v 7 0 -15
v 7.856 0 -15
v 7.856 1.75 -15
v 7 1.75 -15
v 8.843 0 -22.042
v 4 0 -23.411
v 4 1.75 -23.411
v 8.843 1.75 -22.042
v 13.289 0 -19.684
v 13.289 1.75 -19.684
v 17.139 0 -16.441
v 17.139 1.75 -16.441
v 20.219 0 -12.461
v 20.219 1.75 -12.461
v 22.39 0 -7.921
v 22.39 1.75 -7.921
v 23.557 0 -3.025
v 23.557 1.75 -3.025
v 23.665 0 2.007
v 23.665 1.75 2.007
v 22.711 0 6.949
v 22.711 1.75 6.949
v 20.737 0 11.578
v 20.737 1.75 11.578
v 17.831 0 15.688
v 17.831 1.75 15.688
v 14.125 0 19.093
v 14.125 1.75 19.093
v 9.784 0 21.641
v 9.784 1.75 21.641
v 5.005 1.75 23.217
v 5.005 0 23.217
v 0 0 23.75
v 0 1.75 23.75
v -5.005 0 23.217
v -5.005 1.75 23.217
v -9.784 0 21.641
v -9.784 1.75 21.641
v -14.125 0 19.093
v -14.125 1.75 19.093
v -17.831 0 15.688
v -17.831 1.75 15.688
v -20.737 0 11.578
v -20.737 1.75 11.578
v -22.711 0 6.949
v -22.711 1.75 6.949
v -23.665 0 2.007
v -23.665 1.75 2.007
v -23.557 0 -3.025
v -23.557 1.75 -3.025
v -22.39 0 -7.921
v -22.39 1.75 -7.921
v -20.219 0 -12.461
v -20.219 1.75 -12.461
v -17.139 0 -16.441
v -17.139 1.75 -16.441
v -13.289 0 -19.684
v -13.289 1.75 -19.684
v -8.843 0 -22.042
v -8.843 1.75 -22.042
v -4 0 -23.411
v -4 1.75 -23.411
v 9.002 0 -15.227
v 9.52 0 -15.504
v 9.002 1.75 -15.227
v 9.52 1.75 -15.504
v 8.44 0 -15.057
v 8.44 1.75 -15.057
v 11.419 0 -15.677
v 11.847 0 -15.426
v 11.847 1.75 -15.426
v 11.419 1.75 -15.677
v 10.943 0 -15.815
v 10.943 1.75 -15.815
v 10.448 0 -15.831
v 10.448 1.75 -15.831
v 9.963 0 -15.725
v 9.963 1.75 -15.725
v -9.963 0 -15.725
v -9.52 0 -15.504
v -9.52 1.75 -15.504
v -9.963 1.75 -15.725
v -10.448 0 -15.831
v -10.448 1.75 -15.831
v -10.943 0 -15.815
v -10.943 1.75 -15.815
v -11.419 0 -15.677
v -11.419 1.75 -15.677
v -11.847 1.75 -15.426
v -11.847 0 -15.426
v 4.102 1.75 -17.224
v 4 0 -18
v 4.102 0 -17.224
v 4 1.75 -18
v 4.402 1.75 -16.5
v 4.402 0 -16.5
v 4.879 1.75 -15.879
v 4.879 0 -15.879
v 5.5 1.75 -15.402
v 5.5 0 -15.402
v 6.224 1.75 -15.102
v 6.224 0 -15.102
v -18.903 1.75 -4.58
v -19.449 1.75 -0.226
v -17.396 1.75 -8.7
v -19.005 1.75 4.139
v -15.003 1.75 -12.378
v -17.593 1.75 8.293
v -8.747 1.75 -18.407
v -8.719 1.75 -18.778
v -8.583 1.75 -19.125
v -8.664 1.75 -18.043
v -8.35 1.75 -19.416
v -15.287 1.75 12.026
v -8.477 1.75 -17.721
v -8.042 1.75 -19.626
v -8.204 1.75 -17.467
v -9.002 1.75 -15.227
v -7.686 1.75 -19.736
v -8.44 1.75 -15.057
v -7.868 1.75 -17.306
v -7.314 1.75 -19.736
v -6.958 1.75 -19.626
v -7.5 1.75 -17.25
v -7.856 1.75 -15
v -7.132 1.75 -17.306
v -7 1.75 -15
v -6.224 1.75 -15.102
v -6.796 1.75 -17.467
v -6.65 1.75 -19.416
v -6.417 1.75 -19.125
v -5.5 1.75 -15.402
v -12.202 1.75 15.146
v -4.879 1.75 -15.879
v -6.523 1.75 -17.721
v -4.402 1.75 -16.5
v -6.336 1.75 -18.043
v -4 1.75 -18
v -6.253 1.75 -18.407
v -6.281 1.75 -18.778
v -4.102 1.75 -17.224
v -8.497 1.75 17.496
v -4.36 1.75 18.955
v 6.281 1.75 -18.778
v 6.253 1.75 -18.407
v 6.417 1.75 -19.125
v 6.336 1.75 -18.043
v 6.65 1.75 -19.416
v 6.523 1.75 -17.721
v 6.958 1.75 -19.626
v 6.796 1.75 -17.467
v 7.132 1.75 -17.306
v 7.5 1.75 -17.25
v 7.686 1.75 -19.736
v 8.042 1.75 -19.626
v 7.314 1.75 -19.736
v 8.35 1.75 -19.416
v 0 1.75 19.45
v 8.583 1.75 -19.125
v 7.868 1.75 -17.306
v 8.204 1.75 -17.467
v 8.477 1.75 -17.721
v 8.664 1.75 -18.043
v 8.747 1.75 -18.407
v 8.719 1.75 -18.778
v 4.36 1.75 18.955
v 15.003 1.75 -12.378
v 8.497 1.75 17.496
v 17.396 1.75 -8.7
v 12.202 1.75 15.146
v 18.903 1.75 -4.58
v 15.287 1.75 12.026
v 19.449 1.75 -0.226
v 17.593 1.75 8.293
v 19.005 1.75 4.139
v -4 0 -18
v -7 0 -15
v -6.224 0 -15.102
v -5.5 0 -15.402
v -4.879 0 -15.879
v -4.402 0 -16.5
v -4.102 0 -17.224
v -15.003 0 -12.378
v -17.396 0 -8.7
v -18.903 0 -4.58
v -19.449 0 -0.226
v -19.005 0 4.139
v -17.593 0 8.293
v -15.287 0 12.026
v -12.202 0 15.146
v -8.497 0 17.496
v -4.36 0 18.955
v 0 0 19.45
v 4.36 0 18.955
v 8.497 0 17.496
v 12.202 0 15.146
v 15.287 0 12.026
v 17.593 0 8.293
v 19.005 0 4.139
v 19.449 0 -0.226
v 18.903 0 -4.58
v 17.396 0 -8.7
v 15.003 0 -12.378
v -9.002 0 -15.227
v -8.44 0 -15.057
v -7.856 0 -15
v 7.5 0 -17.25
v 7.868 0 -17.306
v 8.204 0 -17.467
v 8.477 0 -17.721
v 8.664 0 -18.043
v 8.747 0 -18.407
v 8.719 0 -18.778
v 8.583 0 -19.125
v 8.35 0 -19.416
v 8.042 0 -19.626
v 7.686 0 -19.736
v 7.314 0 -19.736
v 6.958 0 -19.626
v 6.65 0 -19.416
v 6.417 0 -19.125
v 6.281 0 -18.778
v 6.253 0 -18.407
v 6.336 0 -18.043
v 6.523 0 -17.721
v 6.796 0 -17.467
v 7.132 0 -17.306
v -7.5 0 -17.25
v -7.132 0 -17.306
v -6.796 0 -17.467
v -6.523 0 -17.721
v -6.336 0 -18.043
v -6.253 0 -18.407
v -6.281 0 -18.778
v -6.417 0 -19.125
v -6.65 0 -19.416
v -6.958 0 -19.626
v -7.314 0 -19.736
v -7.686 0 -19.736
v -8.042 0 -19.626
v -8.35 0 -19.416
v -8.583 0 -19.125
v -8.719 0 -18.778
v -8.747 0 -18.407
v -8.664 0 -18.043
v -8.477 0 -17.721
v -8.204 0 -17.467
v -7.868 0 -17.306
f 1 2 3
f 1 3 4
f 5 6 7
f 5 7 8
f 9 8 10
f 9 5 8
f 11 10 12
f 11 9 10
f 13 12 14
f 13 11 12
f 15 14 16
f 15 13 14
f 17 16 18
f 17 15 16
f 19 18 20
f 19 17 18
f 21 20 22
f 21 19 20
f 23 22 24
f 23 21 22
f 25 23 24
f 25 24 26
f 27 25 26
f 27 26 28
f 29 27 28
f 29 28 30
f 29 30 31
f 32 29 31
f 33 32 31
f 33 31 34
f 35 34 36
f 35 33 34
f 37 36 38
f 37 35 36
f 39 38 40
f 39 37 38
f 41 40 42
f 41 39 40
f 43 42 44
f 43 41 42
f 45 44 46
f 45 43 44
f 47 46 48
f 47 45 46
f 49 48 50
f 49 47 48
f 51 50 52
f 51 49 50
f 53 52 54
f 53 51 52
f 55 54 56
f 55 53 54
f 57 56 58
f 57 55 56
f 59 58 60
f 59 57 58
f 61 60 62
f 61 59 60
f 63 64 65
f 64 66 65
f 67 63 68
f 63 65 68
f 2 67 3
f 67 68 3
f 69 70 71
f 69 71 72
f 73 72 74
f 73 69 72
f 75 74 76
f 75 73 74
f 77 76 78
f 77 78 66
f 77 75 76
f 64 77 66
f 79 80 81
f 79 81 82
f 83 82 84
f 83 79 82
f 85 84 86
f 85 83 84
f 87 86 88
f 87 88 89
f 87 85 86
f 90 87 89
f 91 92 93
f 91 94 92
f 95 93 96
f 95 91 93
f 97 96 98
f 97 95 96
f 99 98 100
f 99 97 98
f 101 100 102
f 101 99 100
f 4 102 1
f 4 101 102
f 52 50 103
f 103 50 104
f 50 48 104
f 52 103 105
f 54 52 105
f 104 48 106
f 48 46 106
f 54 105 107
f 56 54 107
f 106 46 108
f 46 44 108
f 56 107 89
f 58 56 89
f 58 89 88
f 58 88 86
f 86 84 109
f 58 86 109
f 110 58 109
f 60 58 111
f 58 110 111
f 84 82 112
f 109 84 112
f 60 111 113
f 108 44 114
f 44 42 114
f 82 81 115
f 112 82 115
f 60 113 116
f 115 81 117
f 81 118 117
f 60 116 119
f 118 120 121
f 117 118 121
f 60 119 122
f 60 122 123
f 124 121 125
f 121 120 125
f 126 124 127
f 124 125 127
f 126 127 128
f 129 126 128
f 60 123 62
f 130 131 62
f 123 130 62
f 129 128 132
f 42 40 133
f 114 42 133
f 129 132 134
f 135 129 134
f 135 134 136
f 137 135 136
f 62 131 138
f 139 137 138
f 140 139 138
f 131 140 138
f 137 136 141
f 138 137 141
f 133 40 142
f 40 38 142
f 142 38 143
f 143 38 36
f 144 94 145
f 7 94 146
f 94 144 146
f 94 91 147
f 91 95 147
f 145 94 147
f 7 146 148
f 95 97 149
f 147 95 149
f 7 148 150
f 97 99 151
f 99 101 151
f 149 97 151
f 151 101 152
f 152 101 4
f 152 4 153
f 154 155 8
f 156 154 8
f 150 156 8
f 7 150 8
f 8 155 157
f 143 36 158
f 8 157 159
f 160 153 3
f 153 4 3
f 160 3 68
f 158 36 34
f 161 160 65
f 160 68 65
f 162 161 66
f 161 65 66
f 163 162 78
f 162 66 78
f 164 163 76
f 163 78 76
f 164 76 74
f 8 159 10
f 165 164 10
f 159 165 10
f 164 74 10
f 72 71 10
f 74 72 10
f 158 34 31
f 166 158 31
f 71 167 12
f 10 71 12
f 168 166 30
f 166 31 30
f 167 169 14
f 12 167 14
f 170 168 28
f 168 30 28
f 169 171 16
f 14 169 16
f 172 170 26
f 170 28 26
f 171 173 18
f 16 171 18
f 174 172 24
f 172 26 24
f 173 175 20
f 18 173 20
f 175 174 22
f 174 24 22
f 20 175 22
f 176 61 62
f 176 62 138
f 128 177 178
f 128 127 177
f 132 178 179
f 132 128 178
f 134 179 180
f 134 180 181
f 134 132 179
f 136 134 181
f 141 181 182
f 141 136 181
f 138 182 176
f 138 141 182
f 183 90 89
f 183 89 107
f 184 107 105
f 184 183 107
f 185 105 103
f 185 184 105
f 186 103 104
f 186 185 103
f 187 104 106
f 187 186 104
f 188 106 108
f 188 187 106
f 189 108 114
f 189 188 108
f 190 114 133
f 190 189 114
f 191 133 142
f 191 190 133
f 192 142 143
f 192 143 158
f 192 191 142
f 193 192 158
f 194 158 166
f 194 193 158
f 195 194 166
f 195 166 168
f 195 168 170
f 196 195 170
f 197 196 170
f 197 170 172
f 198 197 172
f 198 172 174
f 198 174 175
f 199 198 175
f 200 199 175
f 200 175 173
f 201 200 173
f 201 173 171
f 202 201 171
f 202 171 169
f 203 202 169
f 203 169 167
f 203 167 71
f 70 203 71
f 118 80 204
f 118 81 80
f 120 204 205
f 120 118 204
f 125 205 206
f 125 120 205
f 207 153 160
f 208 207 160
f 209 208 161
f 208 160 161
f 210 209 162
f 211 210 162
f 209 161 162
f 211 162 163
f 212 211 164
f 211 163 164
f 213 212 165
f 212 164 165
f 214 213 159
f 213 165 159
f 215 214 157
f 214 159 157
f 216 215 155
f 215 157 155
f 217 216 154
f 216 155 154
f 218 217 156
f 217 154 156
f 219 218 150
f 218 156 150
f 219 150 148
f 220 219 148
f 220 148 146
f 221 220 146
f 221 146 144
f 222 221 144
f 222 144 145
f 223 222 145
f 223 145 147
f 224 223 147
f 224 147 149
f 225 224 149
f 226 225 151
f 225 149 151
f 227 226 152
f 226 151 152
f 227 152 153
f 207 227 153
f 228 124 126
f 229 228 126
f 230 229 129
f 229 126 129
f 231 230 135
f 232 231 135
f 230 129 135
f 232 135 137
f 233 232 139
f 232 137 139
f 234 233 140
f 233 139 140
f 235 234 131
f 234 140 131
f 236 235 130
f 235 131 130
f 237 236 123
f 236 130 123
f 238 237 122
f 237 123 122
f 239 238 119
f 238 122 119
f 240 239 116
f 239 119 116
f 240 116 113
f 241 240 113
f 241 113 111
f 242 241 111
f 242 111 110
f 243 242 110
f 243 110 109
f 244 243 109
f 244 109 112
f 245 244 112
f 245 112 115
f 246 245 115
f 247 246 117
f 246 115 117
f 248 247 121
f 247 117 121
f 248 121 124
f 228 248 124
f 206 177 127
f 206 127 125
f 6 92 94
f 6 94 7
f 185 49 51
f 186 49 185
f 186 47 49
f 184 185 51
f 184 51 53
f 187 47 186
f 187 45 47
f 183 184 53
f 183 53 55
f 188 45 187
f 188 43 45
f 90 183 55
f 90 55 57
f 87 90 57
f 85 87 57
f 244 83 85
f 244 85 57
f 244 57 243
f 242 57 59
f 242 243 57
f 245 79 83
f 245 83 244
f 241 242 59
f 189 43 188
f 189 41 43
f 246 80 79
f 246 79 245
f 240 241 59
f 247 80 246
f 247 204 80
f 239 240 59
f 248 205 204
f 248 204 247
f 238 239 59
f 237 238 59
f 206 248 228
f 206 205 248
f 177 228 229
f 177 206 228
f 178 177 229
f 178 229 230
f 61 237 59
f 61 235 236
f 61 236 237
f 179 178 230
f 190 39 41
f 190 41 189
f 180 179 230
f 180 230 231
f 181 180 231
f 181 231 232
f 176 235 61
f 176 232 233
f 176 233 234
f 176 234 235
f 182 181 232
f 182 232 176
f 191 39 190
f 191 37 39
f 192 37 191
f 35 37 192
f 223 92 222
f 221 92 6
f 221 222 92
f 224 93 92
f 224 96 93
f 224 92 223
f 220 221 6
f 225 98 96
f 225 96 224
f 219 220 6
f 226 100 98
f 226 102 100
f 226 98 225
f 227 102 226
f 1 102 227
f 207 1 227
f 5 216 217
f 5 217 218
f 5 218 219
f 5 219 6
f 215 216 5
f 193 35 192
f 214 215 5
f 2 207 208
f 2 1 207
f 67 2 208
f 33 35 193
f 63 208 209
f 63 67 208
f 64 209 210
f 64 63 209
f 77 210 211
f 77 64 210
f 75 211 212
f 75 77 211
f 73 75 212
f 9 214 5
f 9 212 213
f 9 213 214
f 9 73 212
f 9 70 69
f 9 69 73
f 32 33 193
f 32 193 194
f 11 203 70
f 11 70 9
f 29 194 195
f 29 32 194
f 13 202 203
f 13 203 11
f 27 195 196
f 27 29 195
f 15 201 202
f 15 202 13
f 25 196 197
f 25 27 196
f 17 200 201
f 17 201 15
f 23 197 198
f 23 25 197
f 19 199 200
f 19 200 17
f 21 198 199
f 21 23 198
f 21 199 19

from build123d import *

# Parameters (mm, degrees)
BOSS_EXTRUDE1_DEPTH = 1.75
FILLET2_R           = 2
FILLET3_R           = 3
SKETCH2_R           = 1.2500000000000004
SKETCH2_R_2         = 1.2499999999999996
CUT_EXTRUDE1_DEPTH  = 1.75


with BuildPart() as part:
    # Sketch1 → Boss-Extrude1 (new body)
    with BuildSketch(Plane(origin=(0, 0, 0), x_dir=(1, 0, 0), z_dir=(0, 1, 0))):
        with BuildLine():
            Line((-4, 23.410734717218936), (-4, 19.03424545391805))
            Line((-4, 19.03424545391805), (-3.999999999999999, 15))
            Line((-3.999999999999999, 15), (-9, 15))
            Line((-9, 15), (-9, 17.242462121170515))
            ThreePointArc((-9, 17.242462121170515), (-3.57e-15, -19.45), (9, 17.242462121170515))
            Line((9, 17.242462121170515), (9.000000000000002, 15))
            Line((9.000000000000002, 15), (4, 15))
            Line((4, 15), (4, 19.034245453918047))
            Line((4, 19.034245453918047), (3.999999999999999, 23.410734717218936))
            ThreePointArc((3.999999999999999, 23.410734717218936), (-4.36e-15, -23.75), (-4, 23.410734717218936))
        make_face()
    extrude(amount=BOSS_EXTRUDE1_DEPTH)

    # Fillet2
    # the kernel refuses this fillet: 2 mm, written as the material it adds along each edge
    with BuildSketch(Plane(origin=(9.000000000000005, 0, -17.24246212117051), x_dir=(-2.38e-15, 0, 1), z_dir=(0, 1, 0))) as fillet2_piece_1:
        with BuildLine():
            CenterArc((3.4030154331547133, 1.62883885330701), FILLET2_R, 142.4753629283073, 92.05463357157004)
            Line((1.8168324316629296, 2.8470438794739996), (1.7851087716330947, 2.871407979997339))
            ThreePointArc((1.7851087716330947, 2.871407979997339), (0.812783961312924, 1.4845493734112696), (-0.0354600763417388, 0.01850899742930592))
            Line((-0.0354600763417388, 0.01850899742930592), (1e-16, -0.03999999999999915))
            ThreePointArc((1e-16, -0.03999999999999915), (1.1212310605852558, -0.04000000000000004), (2.219251054930826, -0.03257677706614009))
            Line((2.219251054930826, -0.03257677706614009), (2.24246212117051, 0))
        make_face()
    extrude(amount=1.75)
    with BuildSketch(Plane(origin=(-9, 0, -17.242462121170515), x_dir=(-0.842979895323632, 0, 0.5379450679020662), z_dir=(0, 1, 0))) as fillet2_piece_2:
        with BuildLine():
            CenterArc((3.203713774320002, 1.9924477660817068), FILLET2_R, 182.92614352023125, 92.05463357157015)
            Line((1.2063214380408842, 1.8903504841715306), (1.1663735913153022, 1.8883085385333274))
            ThreePointArc((1.1663735913153022, 1.8883085385333274), (0.5694415232074965, 0.966693044801846), (-0.03371919581294457, 0.02151780271608219))
            Line((-0.03371919581294457, 0.02151780271608219), (-0.00347286045996735, -0.03984895532163413))
            ThreePointArc((-0.00347286045996735, -0.03984895532163413), (1.68867839865919, -0.11344547485539745), (3.380829657778342, -0.03984895532163431))
            Line((3.380829657778342, -0.03984895532163431), (3.3773567973183756, 1.9e-16))
        make_face()
    extrude(amount=1.75)

    # Fillet3
    fillet3_edges = [part.edges().sort_by_distance(p)[0] for p in [
        (-9, 0.875, -15),
        (9.000000000000002, 0.875, -15),
        (4, 0.875, -15),
        (-3.999999999999999, 0.875, -15),
    ]]
    fillet(fillet3_edges, radius=FILLET3_R)

    # Sketch2 → Cut-Extrude1 (cut)
    with BuildSketch(Plane(origin=(0, 1.75, 0), x_dir=(1, 0, 0), z_dir=(0, 1, 0))):
        with Locations(Location((-7.5, 18.5, 0), (0, 0, 270))):
            Circle(SKETCH2_R)
        with Locations(Location((7.5, 18.5, 0), (0, 0, 270))):
            Circle(SKETCH2_R_2)
    extrude(amount=-CUT_EXTRUDE1_DEPTH, mode=Mode.SUBTRACT)


solid = part.part
